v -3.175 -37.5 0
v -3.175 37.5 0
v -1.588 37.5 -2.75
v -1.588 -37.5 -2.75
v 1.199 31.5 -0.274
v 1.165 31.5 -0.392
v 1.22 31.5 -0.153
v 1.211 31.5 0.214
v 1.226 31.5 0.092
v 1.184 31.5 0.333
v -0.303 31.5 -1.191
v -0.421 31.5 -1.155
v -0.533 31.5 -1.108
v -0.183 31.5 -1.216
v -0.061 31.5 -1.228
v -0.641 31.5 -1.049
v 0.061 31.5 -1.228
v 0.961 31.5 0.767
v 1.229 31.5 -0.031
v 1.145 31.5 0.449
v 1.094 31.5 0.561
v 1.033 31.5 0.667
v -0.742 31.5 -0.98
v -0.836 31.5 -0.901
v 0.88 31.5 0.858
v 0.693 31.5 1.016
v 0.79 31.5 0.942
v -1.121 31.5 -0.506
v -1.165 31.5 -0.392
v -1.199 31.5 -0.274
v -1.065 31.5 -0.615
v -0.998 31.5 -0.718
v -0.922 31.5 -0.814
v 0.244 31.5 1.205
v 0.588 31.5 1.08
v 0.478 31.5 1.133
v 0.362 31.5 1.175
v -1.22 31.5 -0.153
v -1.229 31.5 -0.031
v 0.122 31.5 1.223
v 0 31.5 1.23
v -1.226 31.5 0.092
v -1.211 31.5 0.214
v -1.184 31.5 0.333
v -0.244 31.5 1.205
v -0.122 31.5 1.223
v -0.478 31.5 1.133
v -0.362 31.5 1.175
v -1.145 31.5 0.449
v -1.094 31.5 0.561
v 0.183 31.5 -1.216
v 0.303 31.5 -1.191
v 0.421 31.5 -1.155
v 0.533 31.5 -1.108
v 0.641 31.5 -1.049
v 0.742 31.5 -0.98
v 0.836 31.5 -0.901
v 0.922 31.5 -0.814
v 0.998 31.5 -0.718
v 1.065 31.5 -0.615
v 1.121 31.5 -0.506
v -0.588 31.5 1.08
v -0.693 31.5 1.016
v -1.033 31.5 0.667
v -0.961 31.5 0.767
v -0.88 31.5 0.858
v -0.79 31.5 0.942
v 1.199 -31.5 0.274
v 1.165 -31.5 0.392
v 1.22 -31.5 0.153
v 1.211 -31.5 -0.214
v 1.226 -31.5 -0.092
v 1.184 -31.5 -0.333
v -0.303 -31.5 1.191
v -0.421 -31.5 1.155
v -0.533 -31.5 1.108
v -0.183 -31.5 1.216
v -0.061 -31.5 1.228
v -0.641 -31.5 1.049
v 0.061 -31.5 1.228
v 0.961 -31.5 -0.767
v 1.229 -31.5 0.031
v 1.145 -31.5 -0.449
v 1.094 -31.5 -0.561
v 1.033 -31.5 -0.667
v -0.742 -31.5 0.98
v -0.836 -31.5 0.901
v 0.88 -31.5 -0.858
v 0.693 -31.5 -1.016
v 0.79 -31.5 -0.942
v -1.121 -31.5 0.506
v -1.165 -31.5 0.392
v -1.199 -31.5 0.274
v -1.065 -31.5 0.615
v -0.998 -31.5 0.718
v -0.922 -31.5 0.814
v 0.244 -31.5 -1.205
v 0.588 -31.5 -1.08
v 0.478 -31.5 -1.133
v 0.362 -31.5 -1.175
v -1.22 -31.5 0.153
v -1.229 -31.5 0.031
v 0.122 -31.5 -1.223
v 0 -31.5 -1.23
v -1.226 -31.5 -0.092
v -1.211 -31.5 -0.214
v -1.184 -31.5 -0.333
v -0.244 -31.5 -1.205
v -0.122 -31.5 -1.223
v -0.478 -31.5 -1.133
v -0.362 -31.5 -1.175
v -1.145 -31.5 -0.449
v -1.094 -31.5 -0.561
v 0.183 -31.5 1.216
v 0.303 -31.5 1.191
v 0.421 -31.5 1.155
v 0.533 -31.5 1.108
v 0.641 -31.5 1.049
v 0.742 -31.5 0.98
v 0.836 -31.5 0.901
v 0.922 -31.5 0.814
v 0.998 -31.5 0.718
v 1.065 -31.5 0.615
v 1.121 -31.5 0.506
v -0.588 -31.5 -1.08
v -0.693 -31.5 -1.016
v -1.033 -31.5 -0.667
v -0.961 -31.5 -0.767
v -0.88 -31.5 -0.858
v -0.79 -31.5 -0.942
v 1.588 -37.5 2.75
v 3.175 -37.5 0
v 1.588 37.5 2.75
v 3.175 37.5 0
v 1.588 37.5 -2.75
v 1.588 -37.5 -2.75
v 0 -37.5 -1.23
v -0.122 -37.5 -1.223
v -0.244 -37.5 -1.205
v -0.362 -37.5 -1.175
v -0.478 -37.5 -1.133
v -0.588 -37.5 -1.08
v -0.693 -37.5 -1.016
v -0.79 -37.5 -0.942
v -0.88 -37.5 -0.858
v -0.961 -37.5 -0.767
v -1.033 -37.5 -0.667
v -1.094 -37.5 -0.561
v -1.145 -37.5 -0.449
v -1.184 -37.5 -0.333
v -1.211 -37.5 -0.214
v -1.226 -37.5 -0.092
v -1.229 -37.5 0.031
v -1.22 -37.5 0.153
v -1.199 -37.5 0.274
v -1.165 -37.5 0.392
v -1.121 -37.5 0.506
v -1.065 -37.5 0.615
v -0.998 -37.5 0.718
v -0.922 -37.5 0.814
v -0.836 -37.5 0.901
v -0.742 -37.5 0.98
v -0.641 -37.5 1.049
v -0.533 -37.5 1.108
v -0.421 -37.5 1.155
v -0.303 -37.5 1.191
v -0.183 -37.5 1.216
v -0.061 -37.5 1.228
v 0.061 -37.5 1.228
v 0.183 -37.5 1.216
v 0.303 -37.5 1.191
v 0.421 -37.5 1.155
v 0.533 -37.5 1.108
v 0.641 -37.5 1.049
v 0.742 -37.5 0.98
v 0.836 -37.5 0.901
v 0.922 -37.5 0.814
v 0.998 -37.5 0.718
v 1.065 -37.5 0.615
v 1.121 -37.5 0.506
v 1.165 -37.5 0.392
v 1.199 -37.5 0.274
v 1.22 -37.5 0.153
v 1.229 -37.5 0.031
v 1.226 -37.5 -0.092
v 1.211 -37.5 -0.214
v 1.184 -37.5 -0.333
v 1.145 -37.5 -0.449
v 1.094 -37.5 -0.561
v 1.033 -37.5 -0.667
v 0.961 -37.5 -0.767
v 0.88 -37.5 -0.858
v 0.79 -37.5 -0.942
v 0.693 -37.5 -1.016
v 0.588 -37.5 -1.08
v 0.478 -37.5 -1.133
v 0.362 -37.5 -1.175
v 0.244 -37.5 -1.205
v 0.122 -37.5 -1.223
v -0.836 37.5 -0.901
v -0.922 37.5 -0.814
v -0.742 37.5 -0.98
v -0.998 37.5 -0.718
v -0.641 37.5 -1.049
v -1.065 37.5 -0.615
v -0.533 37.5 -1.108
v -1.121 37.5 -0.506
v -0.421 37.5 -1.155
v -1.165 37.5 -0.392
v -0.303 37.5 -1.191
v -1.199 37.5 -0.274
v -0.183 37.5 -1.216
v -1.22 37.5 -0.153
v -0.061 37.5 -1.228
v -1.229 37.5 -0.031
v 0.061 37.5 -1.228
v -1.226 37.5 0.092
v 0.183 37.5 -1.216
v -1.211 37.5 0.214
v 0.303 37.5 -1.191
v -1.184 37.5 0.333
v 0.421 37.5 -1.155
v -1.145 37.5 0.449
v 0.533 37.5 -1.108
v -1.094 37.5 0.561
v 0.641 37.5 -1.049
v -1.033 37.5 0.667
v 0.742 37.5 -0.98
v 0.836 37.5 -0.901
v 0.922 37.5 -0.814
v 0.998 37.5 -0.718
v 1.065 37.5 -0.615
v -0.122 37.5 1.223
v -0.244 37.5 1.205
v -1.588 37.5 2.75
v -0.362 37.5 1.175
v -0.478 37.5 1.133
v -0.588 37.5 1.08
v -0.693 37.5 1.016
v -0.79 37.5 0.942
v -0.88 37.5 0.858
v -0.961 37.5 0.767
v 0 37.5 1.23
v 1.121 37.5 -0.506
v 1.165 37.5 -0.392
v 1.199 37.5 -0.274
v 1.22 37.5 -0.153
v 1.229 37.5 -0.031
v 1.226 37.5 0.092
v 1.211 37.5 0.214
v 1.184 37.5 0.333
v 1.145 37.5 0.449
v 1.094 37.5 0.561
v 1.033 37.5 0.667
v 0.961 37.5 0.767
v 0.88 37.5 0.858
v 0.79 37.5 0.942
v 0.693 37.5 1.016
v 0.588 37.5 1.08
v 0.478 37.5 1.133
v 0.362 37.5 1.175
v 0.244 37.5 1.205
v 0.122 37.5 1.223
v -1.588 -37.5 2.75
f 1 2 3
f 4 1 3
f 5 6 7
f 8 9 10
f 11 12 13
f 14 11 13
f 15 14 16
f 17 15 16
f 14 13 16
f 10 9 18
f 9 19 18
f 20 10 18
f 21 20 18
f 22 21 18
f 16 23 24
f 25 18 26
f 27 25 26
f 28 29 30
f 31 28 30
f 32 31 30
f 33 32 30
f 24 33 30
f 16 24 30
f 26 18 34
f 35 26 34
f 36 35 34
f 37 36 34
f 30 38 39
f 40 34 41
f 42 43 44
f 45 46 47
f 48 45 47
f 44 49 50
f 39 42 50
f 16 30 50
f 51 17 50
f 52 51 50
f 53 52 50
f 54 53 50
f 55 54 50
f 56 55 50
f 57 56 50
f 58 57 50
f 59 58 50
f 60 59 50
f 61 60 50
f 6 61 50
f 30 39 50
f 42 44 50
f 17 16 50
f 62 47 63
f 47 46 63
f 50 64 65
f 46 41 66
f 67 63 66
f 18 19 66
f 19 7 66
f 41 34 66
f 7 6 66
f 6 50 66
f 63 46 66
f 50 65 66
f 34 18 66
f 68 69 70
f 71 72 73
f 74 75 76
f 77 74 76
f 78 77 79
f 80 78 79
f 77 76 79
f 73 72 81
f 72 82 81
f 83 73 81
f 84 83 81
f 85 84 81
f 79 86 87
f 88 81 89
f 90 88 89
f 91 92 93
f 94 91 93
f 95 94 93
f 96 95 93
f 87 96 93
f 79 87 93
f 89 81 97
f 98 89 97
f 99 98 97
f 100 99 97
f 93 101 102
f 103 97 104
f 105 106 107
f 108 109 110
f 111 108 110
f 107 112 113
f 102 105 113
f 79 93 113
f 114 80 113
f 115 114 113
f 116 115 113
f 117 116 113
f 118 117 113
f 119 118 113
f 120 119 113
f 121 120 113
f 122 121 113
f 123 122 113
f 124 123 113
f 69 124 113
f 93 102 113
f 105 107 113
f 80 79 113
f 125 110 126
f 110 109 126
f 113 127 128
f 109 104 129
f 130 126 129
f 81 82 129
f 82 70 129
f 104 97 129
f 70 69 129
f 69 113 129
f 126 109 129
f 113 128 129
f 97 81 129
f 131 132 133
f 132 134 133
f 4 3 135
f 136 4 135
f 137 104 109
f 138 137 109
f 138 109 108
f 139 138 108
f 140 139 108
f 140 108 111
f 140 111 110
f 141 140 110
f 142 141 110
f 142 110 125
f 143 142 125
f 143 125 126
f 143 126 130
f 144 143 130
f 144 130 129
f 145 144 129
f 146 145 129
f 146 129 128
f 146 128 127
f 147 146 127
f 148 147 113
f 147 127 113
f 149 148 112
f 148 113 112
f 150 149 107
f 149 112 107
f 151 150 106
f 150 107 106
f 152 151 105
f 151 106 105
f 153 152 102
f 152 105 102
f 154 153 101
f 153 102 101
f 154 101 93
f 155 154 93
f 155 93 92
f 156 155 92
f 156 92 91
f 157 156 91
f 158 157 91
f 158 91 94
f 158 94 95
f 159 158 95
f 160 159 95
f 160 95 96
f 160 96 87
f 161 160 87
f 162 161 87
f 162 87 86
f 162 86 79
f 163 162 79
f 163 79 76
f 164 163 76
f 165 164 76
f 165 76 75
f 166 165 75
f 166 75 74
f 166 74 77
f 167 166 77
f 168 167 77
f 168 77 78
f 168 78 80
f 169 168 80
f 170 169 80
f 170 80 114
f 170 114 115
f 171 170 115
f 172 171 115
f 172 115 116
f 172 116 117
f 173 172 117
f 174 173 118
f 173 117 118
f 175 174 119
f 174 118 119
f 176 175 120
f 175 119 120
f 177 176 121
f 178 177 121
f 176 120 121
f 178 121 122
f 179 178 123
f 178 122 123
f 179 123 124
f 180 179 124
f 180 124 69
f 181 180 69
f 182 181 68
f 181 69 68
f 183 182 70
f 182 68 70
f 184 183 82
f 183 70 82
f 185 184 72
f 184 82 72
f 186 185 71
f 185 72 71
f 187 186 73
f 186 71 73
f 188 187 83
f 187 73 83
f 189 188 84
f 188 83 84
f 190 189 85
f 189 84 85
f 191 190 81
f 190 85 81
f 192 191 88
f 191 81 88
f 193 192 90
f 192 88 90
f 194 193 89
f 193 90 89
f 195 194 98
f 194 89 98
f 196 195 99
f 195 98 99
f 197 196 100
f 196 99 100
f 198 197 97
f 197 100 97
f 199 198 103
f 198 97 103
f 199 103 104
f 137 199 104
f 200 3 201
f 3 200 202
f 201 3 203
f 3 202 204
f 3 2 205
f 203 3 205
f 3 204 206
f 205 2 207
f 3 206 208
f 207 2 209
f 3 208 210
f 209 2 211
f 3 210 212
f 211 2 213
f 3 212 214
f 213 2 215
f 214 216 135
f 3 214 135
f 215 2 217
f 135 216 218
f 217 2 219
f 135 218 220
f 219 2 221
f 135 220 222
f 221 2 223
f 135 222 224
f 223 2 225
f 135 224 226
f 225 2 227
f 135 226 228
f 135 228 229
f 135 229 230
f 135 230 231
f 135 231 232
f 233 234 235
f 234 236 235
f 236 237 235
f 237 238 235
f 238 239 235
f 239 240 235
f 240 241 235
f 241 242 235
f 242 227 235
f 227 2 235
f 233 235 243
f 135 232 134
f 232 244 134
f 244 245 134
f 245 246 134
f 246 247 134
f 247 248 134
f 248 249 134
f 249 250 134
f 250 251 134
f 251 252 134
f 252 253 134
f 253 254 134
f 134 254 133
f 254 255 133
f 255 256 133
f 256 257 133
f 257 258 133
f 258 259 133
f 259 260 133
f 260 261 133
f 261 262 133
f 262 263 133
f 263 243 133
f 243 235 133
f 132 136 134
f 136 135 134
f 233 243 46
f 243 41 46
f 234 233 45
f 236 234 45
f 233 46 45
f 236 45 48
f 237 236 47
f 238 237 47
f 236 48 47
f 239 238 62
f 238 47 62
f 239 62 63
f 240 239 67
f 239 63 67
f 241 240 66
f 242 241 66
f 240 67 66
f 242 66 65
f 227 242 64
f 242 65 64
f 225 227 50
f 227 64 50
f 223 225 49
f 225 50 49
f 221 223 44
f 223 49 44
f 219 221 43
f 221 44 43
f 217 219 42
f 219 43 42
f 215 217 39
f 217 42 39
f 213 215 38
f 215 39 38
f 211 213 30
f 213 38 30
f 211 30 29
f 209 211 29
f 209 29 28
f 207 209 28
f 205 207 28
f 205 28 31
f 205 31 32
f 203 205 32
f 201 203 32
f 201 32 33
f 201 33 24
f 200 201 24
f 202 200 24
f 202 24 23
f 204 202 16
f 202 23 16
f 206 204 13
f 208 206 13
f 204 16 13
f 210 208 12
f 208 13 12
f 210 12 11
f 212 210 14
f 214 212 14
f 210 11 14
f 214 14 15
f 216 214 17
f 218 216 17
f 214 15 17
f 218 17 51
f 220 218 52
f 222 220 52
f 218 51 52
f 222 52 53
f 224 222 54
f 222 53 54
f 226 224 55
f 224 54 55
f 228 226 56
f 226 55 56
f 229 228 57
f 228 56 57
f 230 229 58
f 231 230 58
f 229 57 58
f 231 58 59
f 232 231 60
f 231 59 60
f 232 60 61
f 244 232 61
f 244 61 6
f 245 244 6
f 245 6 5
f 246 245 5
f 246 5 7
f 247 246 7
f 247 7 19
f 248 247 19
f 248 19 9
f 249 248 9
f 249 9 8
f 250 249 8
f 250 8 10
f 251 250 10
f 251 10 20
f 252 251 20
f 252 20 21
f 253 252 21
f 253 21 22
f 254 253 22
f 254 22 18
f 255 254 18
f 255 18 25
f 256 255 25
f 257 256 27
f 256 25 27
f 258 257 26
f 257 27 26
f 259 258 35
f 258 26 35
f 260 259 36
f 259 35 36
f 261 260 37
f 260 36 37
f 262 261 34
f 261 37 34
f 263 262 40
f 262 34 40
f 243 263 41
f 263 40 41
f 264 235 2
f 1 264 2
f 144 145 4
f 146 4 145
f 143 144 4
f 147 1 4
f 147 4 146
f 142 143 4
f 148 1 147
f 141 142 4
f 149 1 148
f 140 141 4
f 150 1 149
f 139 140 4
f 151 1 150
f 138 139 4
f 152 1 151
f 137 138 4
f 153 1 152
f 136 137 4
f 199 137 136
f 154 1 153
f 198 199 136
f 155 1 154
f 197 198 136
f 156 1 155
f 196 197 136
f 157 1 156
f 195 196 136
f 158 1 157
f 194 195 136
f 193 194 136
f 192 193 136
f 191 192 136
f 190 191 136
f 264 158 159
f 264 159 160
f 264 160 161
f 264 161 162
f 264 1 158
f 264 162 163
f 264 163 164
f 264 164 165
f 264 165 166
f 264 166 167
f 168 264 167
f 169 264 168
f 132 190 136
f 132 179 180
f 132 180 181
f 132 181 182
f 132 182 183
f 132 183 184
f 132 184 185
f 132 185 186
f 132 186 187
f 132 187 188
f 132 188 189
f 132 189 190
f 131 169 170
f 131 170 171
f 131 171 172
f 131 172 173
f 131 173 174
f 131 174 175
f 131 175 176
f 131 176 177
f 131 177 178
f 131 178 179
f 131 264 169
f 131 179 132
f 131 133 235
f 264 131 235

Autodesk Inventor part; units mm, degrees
ref_plane "YZ Plane" through (0, 0, 0) normal (1, 0, 0) x (0, 1, 0)
ref_plane "XZ Plane" through (0, 0, 0) normal (0, 1, 0) x (-1, 0, 0)
ref_plane "XY Plane" through (0, 0, 0) normal (0, 0, 1) x (1, 0, 0)
sketch "スケッチ1" plane through (0, 0, 0) normal (0, 0, 1) x (1, 0, 0)
  line L0 (0, 37.5) -> (0, -37.5)
  line L1 (0, -37.5) -> (4.7631, -37.5)
  line L2 (4.7631, -37.5) -> (4.7631, 37.5)
  line L3 (4.7631, 37.5) -> (0, 37.5)
  point P0 (0, 0)
  point P1 (0, 0)
  dimension "d0" = 75
  dimension "d1" = 4.7631
revolve "回転1" add sketch "スケッチ1" angle 360 about axis through (0, 37.5, 0) along (0, -1, 0)
sketch "スケッチ2" plane through (0, 37.5, 0) normal (0, 1, 0) x (1, 0, 0)
  line L0 (3.1754, 0) -> (1.5877, -2.75)
  line L1 (1.5877, -2.75) -> (-1.5877, -2.75)
  line L2 (-1.5877, -2.75) -> (-3.1754, 0)
  line L3 (-3.1754, 0) -> (-1.5877, 2.75)
  line L4 (-1.5877, 2.75) -> (1.5877, 2.75)
  line L5 (1.5877, 2.75) -> (3.1754, 0)
  circle A0 centre (0, 0) radius 4.7631
  point P0 (0, 0)
  dimension "d3" = 5.5
extrude "押し出し1" cut sketch "スケッチ2" against normal through all
hole "穴1" at (0, 37.5, 0) direction (0, -1, 0) diameter 2.459 depth 6 thread size "M3x0.5" class "6H" standard "ISO Metric profile"
sketch "スケッチ3" plane through (-1.5877, -37.5, 2.75) normal (0, -1, 0) x (1, 0, 0)
  point P0 (1.5877, -2.75)
  point P1 (1.5877, -2.75)
hole "穴2" at (0, -37.5, 0) direction (0, 1, 0) diameter 2.459 depth 6 thread size "M3x0.5" class "6H" standard "ISO Metric profile"
properties part number "ASU-370H" material "アルミニウム 2014-T4"
